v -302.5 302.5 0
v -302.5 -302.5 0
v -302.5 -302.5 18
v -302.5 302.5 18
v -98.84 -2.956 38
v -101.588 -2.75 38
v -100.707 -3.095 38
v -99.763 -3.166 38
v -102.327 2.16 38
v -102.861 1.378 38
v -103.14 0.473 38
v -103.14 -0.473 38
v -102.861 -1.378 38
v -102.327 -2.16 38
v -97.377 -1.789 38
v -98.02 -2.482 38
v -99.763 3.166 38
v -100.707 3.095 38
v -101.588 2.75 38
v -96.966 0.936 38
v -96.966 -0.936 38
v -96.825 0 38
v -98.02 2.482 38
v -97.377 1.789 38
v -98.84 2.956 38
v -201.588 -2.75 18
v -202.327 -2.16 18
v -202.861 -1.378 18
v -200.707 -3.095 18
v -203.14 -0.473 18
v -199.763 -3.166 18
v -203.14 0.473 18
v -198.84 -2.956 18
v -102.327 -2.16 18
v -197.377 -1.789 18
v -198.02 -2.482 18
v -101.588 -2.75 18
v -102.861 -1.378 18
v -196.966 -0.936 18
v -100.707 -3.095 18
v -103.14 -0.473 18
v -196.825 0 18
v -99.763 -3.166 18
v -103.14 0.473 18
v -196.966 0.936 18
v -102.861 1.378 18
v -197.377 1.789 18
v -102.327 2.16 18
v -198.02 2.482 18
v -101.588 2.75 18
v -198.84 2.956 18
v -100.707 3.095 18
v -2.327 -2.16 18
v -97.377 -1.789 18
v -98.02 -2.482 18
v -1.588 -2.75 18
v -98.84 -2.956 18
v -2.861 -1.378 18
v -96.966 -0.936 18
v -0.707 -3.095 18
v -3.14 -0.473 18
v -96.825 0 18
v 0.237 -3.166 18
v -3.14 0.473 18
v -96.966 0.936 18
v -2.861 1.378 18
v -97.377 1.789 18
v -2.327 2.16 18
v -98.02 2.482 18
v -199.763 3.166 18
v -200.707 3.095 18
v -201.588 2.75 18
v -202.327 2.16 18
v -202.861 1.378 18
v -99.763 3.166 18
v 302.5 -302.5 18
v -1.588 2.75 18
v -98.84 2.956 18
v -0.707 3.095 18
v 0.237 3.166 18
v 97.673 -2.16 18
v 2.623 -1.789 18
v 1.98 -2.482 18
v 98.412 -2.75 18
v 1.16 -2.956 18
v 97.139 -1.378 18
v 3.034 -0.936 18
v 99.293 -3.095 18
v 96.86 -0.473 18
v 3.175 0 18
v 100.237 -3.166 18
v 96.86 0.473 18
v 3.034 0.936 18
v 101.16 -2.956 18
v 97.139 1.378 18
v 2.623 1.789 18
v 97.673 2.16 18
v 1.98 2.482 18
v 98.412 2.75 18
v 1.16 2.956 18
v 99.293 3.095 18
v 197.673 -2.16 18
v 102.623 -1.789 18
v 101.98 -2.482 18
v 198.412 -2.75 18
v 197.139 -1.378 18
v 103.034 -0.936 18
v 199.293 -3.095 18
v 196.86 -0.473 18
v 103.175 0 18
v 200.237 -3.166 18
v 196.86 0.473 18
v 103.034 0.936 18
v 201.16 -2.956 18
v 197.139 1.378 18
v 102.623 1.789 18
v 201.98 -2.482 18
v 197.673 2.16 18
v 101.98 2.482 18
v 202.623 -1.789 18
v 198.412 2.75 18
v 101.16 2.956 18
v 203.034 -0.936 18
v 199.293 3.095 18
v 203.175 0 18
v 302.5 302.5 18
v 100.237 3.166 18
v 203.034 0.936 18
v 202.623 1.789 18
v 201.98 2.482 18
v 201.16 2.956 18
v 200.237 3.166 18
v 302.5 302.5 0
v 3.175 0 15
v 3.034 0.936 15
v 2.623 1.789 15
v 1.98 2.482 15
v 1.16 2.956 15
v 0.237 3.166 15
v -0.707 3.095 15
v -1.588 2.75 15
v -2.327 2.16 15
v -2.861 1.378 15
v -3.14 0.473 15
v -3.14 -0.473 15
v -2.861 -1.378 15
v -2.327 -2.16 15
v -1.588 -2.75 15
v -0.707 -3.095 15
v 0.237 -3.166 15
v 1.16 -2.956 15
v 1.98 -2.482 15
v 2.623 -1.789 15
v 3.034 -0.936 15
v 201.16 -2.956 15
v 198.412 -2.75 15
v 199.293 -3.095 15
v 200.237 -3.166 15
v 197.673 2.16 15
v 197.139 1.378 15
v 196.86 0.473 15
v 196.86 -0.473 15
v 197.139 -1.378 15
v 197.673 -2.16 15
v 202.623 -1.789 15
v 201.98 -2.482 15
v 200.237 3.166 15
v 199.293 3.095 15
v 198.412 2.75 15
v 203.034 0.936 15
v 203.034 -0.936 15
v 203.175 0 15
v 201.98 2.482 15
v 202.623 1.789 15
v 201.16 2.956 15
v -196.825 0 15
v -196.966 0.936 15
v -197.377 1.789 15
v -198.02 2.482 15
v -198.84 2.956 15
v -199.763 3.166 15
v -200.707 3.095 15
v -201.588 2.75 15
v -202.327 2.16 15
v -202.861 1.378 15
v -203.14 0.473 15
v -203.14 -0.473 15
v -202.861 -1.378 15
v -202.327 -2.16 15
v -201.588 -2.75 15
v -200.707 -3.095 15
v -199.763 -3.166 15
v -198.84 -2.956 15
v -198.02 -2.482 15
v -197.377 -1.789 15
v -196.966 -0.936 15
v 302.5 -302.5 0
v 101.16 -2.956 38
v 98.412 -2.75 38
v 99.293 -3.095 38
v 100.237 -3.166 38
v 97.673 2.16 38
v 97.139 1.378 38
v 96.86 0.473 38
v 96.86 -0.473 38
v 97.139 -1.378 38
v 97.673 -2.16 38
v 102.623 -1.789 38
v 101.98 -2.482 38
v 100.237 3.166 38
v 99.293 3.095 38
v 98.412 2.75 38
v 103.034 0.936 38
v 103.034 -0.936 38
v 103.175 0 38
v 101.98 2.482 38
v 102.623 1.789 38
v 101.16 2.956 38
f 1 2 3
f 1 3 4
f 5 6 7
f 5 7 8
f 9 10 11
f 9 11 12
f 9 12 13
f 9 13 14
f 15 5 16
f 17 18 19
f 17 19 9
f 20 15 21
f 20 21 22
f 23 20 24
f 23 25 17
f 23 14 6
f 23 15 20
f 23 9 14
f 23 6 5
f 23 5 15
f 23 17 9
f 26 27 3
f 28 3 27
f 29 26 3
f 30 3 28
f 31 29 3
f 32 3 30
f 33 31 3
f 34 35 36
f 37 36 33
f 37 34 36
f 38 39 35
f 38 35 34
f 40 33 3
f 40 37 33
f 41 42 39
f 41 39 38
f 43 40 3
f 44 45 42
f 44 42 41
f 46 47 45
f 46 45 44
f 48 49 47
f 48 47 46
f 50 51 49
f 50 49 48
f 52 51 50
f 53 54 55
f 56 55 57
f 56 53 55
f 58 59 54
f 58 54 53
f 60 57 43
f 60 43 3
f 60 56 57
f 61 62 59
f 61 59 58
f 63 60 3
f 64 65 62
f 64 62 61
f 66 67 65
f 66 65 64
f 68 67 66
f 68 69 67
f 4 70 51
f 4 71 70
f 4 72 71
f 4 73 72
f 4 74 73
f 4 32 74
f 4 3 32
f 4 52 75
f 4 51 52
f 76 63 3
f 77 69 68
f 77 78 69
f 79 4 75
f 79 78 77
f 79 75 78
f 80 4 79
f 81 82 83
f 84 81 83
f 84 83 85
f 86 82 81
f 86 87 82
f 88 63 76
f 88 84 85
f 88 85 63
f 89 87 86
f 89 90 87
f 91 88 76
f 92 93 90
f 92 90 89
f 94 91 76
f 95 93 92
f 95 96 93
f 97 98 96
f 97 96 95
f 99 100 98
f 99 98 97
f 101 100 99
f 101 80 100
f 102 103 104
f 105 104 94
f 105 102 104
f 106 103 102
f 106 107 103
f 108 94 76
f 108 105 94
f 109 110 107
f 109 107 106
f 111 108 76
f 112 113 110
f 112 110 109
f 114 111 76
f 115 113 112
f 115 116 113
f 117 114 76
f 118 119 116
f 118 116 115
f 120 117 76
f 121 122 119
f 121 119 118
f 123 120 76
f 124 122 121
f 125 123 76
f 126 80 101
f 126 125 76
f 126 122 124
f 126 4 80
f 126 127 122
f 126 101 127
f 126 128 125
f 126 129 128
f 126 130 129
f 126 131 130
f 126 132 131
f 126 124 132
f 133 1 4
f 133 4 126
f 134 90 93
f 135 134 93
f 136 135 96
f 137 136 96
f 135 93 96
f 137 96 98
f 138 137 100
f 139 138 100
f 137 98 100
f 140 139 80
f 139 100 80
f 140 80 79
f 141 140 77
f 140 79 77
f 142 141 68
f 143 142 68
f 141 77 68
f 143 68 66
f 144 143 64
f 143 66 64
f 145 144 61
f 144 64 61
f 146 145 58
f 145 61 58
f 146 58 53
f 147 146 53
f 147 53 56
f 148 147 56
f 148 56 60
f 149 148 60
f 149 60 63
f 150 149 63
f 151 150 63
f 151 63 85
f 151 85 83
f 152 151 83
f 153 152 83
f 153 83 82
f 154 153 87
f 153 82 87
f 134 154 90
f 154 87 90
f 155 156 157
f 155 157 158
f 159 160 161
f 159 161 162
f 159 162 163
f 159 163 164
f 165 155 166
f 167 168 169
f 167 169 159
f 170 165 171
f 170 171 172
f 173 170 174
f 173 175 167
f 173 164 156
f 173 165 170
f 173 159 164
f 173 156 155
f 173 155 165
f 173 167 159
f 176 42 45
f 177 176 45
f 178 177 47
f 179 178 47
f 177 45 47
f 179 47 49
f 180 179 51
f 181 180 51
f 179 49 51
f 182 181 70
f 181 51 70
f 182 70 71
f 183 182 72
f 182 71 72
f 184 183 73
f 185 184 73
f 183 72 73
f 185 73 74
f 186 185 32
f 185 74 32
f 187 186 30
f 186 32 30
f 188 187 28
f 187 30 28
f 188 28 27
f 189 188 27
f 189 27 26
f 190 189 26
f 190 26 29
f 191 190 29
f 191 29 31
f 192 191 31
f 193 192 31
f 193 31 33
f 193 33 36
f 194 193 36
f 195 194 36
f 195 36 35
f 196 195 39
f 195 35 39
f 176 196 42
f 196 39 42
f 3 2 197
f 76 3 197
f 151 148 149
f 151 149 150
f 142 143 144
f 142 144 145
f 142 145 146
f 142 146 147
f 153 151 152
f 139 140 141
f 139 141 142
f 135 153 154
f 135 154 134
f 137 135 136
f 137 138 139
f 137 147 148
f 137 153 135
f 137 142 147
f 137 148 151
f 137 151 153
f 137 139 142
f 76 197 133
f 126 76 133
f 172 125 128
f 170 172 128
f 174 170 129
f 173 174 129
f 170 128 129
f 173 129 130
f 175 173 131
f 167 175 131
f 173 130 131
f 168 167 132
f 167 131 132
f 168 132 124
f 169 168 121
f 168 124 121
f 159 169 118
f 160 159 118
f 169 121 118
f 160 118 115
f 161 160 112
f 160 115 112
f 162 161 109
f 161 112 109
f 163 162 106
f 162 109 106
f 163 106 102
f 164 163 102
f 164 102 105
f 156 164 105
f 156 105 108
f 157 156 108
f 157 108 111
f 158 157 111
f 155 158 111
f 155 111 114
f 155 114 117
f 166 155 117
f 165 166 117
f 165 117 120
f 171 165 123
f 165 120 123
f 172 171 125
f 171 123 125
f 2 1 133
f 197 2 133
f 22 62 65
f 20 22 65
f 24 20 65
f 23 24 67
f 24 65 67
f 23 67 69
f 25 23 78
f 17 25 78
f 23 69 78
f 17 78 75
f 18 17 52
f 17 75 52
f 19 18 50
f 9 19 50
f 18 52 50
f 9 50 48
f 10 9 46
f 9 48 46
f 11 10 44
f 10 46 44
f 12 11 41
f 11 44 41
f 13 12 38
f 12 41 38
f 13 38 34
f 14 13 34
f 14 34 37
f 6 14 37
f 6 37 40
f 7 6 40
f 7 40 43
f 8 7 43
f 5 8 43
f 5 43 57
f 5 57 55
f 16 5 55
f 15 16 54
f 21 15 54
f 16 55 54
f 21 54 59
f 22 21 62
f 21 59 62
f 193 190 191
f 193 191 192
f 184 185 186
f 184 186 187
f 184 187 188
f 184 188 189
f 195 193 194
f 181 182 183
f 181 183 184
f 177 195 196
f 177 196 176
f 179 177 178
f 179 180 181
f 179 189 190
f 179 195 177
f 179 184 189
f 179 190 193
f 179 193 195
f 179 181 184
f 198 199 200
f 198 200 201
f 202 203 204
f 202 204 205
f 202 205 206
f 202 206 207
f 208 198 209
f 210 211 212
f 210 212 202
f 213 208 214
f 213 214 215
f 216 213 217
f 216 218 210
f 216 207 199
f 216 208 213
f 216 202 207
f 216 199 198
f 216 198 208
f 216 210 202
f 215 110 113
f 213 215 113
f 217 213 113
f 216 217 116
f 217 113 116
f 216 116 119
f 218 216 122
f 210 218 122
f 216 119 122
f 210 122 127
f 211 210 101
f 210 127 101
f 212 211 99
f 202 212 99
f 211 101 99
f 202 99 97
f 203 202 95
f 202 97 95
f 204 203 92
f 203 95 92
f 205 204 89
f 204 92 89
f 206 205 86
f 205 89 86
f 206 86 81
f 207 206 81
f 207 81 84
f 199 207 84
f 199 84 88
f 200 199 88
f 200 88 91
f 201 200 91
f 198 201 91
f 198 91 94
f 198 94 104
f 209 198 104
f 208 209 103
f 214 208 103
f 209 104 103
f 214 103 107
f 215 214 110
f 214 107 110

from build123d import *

# Parameters (mm, degrees)
SKETCH_W     = 605
SKETCH_H     = 605
PAD_DEPTH    = 18
SKETCH001_R  = 3.175
PAD001_DEPTH = 20
SKETCH002_R  = 3.175
POCKET_DEPTH = 3


with BuildPart() as part:
    # Sketch → Pad (new body)
    with BuildSketch(Plane.XY):
        Rectangle(SKETCH_W, SKETCH_H)
    extrude(amount=PAD_DEPTH)

    # Sketch001 (on Face6 of Pad) → Pad001 (join)
    with BuildSketch(Plane.XY.offset(18)):
        with Locations((-100, 0)):
            Circle(SKETCH001_R)
        with Locations((100, 0)):
            Circle(SKETCH001_R)
    extrude(amount=PAD001_DEPTH)

    # Sketch002 (on Face5 of Pad001) → Pocket (cut)
    with BuildSketch(Plane.XY.offset(18)):
        with Locations((-200, 0)):
            Circle(SKETCH002_R)
        Circle(SKETCH002_R)
        with Locations((200, 0)):
            Circle(SKETCH002_R)
    extrude(amount=-POCKET_DEPTH, mode=Mode.SUBTRACT)


solid = part.part
